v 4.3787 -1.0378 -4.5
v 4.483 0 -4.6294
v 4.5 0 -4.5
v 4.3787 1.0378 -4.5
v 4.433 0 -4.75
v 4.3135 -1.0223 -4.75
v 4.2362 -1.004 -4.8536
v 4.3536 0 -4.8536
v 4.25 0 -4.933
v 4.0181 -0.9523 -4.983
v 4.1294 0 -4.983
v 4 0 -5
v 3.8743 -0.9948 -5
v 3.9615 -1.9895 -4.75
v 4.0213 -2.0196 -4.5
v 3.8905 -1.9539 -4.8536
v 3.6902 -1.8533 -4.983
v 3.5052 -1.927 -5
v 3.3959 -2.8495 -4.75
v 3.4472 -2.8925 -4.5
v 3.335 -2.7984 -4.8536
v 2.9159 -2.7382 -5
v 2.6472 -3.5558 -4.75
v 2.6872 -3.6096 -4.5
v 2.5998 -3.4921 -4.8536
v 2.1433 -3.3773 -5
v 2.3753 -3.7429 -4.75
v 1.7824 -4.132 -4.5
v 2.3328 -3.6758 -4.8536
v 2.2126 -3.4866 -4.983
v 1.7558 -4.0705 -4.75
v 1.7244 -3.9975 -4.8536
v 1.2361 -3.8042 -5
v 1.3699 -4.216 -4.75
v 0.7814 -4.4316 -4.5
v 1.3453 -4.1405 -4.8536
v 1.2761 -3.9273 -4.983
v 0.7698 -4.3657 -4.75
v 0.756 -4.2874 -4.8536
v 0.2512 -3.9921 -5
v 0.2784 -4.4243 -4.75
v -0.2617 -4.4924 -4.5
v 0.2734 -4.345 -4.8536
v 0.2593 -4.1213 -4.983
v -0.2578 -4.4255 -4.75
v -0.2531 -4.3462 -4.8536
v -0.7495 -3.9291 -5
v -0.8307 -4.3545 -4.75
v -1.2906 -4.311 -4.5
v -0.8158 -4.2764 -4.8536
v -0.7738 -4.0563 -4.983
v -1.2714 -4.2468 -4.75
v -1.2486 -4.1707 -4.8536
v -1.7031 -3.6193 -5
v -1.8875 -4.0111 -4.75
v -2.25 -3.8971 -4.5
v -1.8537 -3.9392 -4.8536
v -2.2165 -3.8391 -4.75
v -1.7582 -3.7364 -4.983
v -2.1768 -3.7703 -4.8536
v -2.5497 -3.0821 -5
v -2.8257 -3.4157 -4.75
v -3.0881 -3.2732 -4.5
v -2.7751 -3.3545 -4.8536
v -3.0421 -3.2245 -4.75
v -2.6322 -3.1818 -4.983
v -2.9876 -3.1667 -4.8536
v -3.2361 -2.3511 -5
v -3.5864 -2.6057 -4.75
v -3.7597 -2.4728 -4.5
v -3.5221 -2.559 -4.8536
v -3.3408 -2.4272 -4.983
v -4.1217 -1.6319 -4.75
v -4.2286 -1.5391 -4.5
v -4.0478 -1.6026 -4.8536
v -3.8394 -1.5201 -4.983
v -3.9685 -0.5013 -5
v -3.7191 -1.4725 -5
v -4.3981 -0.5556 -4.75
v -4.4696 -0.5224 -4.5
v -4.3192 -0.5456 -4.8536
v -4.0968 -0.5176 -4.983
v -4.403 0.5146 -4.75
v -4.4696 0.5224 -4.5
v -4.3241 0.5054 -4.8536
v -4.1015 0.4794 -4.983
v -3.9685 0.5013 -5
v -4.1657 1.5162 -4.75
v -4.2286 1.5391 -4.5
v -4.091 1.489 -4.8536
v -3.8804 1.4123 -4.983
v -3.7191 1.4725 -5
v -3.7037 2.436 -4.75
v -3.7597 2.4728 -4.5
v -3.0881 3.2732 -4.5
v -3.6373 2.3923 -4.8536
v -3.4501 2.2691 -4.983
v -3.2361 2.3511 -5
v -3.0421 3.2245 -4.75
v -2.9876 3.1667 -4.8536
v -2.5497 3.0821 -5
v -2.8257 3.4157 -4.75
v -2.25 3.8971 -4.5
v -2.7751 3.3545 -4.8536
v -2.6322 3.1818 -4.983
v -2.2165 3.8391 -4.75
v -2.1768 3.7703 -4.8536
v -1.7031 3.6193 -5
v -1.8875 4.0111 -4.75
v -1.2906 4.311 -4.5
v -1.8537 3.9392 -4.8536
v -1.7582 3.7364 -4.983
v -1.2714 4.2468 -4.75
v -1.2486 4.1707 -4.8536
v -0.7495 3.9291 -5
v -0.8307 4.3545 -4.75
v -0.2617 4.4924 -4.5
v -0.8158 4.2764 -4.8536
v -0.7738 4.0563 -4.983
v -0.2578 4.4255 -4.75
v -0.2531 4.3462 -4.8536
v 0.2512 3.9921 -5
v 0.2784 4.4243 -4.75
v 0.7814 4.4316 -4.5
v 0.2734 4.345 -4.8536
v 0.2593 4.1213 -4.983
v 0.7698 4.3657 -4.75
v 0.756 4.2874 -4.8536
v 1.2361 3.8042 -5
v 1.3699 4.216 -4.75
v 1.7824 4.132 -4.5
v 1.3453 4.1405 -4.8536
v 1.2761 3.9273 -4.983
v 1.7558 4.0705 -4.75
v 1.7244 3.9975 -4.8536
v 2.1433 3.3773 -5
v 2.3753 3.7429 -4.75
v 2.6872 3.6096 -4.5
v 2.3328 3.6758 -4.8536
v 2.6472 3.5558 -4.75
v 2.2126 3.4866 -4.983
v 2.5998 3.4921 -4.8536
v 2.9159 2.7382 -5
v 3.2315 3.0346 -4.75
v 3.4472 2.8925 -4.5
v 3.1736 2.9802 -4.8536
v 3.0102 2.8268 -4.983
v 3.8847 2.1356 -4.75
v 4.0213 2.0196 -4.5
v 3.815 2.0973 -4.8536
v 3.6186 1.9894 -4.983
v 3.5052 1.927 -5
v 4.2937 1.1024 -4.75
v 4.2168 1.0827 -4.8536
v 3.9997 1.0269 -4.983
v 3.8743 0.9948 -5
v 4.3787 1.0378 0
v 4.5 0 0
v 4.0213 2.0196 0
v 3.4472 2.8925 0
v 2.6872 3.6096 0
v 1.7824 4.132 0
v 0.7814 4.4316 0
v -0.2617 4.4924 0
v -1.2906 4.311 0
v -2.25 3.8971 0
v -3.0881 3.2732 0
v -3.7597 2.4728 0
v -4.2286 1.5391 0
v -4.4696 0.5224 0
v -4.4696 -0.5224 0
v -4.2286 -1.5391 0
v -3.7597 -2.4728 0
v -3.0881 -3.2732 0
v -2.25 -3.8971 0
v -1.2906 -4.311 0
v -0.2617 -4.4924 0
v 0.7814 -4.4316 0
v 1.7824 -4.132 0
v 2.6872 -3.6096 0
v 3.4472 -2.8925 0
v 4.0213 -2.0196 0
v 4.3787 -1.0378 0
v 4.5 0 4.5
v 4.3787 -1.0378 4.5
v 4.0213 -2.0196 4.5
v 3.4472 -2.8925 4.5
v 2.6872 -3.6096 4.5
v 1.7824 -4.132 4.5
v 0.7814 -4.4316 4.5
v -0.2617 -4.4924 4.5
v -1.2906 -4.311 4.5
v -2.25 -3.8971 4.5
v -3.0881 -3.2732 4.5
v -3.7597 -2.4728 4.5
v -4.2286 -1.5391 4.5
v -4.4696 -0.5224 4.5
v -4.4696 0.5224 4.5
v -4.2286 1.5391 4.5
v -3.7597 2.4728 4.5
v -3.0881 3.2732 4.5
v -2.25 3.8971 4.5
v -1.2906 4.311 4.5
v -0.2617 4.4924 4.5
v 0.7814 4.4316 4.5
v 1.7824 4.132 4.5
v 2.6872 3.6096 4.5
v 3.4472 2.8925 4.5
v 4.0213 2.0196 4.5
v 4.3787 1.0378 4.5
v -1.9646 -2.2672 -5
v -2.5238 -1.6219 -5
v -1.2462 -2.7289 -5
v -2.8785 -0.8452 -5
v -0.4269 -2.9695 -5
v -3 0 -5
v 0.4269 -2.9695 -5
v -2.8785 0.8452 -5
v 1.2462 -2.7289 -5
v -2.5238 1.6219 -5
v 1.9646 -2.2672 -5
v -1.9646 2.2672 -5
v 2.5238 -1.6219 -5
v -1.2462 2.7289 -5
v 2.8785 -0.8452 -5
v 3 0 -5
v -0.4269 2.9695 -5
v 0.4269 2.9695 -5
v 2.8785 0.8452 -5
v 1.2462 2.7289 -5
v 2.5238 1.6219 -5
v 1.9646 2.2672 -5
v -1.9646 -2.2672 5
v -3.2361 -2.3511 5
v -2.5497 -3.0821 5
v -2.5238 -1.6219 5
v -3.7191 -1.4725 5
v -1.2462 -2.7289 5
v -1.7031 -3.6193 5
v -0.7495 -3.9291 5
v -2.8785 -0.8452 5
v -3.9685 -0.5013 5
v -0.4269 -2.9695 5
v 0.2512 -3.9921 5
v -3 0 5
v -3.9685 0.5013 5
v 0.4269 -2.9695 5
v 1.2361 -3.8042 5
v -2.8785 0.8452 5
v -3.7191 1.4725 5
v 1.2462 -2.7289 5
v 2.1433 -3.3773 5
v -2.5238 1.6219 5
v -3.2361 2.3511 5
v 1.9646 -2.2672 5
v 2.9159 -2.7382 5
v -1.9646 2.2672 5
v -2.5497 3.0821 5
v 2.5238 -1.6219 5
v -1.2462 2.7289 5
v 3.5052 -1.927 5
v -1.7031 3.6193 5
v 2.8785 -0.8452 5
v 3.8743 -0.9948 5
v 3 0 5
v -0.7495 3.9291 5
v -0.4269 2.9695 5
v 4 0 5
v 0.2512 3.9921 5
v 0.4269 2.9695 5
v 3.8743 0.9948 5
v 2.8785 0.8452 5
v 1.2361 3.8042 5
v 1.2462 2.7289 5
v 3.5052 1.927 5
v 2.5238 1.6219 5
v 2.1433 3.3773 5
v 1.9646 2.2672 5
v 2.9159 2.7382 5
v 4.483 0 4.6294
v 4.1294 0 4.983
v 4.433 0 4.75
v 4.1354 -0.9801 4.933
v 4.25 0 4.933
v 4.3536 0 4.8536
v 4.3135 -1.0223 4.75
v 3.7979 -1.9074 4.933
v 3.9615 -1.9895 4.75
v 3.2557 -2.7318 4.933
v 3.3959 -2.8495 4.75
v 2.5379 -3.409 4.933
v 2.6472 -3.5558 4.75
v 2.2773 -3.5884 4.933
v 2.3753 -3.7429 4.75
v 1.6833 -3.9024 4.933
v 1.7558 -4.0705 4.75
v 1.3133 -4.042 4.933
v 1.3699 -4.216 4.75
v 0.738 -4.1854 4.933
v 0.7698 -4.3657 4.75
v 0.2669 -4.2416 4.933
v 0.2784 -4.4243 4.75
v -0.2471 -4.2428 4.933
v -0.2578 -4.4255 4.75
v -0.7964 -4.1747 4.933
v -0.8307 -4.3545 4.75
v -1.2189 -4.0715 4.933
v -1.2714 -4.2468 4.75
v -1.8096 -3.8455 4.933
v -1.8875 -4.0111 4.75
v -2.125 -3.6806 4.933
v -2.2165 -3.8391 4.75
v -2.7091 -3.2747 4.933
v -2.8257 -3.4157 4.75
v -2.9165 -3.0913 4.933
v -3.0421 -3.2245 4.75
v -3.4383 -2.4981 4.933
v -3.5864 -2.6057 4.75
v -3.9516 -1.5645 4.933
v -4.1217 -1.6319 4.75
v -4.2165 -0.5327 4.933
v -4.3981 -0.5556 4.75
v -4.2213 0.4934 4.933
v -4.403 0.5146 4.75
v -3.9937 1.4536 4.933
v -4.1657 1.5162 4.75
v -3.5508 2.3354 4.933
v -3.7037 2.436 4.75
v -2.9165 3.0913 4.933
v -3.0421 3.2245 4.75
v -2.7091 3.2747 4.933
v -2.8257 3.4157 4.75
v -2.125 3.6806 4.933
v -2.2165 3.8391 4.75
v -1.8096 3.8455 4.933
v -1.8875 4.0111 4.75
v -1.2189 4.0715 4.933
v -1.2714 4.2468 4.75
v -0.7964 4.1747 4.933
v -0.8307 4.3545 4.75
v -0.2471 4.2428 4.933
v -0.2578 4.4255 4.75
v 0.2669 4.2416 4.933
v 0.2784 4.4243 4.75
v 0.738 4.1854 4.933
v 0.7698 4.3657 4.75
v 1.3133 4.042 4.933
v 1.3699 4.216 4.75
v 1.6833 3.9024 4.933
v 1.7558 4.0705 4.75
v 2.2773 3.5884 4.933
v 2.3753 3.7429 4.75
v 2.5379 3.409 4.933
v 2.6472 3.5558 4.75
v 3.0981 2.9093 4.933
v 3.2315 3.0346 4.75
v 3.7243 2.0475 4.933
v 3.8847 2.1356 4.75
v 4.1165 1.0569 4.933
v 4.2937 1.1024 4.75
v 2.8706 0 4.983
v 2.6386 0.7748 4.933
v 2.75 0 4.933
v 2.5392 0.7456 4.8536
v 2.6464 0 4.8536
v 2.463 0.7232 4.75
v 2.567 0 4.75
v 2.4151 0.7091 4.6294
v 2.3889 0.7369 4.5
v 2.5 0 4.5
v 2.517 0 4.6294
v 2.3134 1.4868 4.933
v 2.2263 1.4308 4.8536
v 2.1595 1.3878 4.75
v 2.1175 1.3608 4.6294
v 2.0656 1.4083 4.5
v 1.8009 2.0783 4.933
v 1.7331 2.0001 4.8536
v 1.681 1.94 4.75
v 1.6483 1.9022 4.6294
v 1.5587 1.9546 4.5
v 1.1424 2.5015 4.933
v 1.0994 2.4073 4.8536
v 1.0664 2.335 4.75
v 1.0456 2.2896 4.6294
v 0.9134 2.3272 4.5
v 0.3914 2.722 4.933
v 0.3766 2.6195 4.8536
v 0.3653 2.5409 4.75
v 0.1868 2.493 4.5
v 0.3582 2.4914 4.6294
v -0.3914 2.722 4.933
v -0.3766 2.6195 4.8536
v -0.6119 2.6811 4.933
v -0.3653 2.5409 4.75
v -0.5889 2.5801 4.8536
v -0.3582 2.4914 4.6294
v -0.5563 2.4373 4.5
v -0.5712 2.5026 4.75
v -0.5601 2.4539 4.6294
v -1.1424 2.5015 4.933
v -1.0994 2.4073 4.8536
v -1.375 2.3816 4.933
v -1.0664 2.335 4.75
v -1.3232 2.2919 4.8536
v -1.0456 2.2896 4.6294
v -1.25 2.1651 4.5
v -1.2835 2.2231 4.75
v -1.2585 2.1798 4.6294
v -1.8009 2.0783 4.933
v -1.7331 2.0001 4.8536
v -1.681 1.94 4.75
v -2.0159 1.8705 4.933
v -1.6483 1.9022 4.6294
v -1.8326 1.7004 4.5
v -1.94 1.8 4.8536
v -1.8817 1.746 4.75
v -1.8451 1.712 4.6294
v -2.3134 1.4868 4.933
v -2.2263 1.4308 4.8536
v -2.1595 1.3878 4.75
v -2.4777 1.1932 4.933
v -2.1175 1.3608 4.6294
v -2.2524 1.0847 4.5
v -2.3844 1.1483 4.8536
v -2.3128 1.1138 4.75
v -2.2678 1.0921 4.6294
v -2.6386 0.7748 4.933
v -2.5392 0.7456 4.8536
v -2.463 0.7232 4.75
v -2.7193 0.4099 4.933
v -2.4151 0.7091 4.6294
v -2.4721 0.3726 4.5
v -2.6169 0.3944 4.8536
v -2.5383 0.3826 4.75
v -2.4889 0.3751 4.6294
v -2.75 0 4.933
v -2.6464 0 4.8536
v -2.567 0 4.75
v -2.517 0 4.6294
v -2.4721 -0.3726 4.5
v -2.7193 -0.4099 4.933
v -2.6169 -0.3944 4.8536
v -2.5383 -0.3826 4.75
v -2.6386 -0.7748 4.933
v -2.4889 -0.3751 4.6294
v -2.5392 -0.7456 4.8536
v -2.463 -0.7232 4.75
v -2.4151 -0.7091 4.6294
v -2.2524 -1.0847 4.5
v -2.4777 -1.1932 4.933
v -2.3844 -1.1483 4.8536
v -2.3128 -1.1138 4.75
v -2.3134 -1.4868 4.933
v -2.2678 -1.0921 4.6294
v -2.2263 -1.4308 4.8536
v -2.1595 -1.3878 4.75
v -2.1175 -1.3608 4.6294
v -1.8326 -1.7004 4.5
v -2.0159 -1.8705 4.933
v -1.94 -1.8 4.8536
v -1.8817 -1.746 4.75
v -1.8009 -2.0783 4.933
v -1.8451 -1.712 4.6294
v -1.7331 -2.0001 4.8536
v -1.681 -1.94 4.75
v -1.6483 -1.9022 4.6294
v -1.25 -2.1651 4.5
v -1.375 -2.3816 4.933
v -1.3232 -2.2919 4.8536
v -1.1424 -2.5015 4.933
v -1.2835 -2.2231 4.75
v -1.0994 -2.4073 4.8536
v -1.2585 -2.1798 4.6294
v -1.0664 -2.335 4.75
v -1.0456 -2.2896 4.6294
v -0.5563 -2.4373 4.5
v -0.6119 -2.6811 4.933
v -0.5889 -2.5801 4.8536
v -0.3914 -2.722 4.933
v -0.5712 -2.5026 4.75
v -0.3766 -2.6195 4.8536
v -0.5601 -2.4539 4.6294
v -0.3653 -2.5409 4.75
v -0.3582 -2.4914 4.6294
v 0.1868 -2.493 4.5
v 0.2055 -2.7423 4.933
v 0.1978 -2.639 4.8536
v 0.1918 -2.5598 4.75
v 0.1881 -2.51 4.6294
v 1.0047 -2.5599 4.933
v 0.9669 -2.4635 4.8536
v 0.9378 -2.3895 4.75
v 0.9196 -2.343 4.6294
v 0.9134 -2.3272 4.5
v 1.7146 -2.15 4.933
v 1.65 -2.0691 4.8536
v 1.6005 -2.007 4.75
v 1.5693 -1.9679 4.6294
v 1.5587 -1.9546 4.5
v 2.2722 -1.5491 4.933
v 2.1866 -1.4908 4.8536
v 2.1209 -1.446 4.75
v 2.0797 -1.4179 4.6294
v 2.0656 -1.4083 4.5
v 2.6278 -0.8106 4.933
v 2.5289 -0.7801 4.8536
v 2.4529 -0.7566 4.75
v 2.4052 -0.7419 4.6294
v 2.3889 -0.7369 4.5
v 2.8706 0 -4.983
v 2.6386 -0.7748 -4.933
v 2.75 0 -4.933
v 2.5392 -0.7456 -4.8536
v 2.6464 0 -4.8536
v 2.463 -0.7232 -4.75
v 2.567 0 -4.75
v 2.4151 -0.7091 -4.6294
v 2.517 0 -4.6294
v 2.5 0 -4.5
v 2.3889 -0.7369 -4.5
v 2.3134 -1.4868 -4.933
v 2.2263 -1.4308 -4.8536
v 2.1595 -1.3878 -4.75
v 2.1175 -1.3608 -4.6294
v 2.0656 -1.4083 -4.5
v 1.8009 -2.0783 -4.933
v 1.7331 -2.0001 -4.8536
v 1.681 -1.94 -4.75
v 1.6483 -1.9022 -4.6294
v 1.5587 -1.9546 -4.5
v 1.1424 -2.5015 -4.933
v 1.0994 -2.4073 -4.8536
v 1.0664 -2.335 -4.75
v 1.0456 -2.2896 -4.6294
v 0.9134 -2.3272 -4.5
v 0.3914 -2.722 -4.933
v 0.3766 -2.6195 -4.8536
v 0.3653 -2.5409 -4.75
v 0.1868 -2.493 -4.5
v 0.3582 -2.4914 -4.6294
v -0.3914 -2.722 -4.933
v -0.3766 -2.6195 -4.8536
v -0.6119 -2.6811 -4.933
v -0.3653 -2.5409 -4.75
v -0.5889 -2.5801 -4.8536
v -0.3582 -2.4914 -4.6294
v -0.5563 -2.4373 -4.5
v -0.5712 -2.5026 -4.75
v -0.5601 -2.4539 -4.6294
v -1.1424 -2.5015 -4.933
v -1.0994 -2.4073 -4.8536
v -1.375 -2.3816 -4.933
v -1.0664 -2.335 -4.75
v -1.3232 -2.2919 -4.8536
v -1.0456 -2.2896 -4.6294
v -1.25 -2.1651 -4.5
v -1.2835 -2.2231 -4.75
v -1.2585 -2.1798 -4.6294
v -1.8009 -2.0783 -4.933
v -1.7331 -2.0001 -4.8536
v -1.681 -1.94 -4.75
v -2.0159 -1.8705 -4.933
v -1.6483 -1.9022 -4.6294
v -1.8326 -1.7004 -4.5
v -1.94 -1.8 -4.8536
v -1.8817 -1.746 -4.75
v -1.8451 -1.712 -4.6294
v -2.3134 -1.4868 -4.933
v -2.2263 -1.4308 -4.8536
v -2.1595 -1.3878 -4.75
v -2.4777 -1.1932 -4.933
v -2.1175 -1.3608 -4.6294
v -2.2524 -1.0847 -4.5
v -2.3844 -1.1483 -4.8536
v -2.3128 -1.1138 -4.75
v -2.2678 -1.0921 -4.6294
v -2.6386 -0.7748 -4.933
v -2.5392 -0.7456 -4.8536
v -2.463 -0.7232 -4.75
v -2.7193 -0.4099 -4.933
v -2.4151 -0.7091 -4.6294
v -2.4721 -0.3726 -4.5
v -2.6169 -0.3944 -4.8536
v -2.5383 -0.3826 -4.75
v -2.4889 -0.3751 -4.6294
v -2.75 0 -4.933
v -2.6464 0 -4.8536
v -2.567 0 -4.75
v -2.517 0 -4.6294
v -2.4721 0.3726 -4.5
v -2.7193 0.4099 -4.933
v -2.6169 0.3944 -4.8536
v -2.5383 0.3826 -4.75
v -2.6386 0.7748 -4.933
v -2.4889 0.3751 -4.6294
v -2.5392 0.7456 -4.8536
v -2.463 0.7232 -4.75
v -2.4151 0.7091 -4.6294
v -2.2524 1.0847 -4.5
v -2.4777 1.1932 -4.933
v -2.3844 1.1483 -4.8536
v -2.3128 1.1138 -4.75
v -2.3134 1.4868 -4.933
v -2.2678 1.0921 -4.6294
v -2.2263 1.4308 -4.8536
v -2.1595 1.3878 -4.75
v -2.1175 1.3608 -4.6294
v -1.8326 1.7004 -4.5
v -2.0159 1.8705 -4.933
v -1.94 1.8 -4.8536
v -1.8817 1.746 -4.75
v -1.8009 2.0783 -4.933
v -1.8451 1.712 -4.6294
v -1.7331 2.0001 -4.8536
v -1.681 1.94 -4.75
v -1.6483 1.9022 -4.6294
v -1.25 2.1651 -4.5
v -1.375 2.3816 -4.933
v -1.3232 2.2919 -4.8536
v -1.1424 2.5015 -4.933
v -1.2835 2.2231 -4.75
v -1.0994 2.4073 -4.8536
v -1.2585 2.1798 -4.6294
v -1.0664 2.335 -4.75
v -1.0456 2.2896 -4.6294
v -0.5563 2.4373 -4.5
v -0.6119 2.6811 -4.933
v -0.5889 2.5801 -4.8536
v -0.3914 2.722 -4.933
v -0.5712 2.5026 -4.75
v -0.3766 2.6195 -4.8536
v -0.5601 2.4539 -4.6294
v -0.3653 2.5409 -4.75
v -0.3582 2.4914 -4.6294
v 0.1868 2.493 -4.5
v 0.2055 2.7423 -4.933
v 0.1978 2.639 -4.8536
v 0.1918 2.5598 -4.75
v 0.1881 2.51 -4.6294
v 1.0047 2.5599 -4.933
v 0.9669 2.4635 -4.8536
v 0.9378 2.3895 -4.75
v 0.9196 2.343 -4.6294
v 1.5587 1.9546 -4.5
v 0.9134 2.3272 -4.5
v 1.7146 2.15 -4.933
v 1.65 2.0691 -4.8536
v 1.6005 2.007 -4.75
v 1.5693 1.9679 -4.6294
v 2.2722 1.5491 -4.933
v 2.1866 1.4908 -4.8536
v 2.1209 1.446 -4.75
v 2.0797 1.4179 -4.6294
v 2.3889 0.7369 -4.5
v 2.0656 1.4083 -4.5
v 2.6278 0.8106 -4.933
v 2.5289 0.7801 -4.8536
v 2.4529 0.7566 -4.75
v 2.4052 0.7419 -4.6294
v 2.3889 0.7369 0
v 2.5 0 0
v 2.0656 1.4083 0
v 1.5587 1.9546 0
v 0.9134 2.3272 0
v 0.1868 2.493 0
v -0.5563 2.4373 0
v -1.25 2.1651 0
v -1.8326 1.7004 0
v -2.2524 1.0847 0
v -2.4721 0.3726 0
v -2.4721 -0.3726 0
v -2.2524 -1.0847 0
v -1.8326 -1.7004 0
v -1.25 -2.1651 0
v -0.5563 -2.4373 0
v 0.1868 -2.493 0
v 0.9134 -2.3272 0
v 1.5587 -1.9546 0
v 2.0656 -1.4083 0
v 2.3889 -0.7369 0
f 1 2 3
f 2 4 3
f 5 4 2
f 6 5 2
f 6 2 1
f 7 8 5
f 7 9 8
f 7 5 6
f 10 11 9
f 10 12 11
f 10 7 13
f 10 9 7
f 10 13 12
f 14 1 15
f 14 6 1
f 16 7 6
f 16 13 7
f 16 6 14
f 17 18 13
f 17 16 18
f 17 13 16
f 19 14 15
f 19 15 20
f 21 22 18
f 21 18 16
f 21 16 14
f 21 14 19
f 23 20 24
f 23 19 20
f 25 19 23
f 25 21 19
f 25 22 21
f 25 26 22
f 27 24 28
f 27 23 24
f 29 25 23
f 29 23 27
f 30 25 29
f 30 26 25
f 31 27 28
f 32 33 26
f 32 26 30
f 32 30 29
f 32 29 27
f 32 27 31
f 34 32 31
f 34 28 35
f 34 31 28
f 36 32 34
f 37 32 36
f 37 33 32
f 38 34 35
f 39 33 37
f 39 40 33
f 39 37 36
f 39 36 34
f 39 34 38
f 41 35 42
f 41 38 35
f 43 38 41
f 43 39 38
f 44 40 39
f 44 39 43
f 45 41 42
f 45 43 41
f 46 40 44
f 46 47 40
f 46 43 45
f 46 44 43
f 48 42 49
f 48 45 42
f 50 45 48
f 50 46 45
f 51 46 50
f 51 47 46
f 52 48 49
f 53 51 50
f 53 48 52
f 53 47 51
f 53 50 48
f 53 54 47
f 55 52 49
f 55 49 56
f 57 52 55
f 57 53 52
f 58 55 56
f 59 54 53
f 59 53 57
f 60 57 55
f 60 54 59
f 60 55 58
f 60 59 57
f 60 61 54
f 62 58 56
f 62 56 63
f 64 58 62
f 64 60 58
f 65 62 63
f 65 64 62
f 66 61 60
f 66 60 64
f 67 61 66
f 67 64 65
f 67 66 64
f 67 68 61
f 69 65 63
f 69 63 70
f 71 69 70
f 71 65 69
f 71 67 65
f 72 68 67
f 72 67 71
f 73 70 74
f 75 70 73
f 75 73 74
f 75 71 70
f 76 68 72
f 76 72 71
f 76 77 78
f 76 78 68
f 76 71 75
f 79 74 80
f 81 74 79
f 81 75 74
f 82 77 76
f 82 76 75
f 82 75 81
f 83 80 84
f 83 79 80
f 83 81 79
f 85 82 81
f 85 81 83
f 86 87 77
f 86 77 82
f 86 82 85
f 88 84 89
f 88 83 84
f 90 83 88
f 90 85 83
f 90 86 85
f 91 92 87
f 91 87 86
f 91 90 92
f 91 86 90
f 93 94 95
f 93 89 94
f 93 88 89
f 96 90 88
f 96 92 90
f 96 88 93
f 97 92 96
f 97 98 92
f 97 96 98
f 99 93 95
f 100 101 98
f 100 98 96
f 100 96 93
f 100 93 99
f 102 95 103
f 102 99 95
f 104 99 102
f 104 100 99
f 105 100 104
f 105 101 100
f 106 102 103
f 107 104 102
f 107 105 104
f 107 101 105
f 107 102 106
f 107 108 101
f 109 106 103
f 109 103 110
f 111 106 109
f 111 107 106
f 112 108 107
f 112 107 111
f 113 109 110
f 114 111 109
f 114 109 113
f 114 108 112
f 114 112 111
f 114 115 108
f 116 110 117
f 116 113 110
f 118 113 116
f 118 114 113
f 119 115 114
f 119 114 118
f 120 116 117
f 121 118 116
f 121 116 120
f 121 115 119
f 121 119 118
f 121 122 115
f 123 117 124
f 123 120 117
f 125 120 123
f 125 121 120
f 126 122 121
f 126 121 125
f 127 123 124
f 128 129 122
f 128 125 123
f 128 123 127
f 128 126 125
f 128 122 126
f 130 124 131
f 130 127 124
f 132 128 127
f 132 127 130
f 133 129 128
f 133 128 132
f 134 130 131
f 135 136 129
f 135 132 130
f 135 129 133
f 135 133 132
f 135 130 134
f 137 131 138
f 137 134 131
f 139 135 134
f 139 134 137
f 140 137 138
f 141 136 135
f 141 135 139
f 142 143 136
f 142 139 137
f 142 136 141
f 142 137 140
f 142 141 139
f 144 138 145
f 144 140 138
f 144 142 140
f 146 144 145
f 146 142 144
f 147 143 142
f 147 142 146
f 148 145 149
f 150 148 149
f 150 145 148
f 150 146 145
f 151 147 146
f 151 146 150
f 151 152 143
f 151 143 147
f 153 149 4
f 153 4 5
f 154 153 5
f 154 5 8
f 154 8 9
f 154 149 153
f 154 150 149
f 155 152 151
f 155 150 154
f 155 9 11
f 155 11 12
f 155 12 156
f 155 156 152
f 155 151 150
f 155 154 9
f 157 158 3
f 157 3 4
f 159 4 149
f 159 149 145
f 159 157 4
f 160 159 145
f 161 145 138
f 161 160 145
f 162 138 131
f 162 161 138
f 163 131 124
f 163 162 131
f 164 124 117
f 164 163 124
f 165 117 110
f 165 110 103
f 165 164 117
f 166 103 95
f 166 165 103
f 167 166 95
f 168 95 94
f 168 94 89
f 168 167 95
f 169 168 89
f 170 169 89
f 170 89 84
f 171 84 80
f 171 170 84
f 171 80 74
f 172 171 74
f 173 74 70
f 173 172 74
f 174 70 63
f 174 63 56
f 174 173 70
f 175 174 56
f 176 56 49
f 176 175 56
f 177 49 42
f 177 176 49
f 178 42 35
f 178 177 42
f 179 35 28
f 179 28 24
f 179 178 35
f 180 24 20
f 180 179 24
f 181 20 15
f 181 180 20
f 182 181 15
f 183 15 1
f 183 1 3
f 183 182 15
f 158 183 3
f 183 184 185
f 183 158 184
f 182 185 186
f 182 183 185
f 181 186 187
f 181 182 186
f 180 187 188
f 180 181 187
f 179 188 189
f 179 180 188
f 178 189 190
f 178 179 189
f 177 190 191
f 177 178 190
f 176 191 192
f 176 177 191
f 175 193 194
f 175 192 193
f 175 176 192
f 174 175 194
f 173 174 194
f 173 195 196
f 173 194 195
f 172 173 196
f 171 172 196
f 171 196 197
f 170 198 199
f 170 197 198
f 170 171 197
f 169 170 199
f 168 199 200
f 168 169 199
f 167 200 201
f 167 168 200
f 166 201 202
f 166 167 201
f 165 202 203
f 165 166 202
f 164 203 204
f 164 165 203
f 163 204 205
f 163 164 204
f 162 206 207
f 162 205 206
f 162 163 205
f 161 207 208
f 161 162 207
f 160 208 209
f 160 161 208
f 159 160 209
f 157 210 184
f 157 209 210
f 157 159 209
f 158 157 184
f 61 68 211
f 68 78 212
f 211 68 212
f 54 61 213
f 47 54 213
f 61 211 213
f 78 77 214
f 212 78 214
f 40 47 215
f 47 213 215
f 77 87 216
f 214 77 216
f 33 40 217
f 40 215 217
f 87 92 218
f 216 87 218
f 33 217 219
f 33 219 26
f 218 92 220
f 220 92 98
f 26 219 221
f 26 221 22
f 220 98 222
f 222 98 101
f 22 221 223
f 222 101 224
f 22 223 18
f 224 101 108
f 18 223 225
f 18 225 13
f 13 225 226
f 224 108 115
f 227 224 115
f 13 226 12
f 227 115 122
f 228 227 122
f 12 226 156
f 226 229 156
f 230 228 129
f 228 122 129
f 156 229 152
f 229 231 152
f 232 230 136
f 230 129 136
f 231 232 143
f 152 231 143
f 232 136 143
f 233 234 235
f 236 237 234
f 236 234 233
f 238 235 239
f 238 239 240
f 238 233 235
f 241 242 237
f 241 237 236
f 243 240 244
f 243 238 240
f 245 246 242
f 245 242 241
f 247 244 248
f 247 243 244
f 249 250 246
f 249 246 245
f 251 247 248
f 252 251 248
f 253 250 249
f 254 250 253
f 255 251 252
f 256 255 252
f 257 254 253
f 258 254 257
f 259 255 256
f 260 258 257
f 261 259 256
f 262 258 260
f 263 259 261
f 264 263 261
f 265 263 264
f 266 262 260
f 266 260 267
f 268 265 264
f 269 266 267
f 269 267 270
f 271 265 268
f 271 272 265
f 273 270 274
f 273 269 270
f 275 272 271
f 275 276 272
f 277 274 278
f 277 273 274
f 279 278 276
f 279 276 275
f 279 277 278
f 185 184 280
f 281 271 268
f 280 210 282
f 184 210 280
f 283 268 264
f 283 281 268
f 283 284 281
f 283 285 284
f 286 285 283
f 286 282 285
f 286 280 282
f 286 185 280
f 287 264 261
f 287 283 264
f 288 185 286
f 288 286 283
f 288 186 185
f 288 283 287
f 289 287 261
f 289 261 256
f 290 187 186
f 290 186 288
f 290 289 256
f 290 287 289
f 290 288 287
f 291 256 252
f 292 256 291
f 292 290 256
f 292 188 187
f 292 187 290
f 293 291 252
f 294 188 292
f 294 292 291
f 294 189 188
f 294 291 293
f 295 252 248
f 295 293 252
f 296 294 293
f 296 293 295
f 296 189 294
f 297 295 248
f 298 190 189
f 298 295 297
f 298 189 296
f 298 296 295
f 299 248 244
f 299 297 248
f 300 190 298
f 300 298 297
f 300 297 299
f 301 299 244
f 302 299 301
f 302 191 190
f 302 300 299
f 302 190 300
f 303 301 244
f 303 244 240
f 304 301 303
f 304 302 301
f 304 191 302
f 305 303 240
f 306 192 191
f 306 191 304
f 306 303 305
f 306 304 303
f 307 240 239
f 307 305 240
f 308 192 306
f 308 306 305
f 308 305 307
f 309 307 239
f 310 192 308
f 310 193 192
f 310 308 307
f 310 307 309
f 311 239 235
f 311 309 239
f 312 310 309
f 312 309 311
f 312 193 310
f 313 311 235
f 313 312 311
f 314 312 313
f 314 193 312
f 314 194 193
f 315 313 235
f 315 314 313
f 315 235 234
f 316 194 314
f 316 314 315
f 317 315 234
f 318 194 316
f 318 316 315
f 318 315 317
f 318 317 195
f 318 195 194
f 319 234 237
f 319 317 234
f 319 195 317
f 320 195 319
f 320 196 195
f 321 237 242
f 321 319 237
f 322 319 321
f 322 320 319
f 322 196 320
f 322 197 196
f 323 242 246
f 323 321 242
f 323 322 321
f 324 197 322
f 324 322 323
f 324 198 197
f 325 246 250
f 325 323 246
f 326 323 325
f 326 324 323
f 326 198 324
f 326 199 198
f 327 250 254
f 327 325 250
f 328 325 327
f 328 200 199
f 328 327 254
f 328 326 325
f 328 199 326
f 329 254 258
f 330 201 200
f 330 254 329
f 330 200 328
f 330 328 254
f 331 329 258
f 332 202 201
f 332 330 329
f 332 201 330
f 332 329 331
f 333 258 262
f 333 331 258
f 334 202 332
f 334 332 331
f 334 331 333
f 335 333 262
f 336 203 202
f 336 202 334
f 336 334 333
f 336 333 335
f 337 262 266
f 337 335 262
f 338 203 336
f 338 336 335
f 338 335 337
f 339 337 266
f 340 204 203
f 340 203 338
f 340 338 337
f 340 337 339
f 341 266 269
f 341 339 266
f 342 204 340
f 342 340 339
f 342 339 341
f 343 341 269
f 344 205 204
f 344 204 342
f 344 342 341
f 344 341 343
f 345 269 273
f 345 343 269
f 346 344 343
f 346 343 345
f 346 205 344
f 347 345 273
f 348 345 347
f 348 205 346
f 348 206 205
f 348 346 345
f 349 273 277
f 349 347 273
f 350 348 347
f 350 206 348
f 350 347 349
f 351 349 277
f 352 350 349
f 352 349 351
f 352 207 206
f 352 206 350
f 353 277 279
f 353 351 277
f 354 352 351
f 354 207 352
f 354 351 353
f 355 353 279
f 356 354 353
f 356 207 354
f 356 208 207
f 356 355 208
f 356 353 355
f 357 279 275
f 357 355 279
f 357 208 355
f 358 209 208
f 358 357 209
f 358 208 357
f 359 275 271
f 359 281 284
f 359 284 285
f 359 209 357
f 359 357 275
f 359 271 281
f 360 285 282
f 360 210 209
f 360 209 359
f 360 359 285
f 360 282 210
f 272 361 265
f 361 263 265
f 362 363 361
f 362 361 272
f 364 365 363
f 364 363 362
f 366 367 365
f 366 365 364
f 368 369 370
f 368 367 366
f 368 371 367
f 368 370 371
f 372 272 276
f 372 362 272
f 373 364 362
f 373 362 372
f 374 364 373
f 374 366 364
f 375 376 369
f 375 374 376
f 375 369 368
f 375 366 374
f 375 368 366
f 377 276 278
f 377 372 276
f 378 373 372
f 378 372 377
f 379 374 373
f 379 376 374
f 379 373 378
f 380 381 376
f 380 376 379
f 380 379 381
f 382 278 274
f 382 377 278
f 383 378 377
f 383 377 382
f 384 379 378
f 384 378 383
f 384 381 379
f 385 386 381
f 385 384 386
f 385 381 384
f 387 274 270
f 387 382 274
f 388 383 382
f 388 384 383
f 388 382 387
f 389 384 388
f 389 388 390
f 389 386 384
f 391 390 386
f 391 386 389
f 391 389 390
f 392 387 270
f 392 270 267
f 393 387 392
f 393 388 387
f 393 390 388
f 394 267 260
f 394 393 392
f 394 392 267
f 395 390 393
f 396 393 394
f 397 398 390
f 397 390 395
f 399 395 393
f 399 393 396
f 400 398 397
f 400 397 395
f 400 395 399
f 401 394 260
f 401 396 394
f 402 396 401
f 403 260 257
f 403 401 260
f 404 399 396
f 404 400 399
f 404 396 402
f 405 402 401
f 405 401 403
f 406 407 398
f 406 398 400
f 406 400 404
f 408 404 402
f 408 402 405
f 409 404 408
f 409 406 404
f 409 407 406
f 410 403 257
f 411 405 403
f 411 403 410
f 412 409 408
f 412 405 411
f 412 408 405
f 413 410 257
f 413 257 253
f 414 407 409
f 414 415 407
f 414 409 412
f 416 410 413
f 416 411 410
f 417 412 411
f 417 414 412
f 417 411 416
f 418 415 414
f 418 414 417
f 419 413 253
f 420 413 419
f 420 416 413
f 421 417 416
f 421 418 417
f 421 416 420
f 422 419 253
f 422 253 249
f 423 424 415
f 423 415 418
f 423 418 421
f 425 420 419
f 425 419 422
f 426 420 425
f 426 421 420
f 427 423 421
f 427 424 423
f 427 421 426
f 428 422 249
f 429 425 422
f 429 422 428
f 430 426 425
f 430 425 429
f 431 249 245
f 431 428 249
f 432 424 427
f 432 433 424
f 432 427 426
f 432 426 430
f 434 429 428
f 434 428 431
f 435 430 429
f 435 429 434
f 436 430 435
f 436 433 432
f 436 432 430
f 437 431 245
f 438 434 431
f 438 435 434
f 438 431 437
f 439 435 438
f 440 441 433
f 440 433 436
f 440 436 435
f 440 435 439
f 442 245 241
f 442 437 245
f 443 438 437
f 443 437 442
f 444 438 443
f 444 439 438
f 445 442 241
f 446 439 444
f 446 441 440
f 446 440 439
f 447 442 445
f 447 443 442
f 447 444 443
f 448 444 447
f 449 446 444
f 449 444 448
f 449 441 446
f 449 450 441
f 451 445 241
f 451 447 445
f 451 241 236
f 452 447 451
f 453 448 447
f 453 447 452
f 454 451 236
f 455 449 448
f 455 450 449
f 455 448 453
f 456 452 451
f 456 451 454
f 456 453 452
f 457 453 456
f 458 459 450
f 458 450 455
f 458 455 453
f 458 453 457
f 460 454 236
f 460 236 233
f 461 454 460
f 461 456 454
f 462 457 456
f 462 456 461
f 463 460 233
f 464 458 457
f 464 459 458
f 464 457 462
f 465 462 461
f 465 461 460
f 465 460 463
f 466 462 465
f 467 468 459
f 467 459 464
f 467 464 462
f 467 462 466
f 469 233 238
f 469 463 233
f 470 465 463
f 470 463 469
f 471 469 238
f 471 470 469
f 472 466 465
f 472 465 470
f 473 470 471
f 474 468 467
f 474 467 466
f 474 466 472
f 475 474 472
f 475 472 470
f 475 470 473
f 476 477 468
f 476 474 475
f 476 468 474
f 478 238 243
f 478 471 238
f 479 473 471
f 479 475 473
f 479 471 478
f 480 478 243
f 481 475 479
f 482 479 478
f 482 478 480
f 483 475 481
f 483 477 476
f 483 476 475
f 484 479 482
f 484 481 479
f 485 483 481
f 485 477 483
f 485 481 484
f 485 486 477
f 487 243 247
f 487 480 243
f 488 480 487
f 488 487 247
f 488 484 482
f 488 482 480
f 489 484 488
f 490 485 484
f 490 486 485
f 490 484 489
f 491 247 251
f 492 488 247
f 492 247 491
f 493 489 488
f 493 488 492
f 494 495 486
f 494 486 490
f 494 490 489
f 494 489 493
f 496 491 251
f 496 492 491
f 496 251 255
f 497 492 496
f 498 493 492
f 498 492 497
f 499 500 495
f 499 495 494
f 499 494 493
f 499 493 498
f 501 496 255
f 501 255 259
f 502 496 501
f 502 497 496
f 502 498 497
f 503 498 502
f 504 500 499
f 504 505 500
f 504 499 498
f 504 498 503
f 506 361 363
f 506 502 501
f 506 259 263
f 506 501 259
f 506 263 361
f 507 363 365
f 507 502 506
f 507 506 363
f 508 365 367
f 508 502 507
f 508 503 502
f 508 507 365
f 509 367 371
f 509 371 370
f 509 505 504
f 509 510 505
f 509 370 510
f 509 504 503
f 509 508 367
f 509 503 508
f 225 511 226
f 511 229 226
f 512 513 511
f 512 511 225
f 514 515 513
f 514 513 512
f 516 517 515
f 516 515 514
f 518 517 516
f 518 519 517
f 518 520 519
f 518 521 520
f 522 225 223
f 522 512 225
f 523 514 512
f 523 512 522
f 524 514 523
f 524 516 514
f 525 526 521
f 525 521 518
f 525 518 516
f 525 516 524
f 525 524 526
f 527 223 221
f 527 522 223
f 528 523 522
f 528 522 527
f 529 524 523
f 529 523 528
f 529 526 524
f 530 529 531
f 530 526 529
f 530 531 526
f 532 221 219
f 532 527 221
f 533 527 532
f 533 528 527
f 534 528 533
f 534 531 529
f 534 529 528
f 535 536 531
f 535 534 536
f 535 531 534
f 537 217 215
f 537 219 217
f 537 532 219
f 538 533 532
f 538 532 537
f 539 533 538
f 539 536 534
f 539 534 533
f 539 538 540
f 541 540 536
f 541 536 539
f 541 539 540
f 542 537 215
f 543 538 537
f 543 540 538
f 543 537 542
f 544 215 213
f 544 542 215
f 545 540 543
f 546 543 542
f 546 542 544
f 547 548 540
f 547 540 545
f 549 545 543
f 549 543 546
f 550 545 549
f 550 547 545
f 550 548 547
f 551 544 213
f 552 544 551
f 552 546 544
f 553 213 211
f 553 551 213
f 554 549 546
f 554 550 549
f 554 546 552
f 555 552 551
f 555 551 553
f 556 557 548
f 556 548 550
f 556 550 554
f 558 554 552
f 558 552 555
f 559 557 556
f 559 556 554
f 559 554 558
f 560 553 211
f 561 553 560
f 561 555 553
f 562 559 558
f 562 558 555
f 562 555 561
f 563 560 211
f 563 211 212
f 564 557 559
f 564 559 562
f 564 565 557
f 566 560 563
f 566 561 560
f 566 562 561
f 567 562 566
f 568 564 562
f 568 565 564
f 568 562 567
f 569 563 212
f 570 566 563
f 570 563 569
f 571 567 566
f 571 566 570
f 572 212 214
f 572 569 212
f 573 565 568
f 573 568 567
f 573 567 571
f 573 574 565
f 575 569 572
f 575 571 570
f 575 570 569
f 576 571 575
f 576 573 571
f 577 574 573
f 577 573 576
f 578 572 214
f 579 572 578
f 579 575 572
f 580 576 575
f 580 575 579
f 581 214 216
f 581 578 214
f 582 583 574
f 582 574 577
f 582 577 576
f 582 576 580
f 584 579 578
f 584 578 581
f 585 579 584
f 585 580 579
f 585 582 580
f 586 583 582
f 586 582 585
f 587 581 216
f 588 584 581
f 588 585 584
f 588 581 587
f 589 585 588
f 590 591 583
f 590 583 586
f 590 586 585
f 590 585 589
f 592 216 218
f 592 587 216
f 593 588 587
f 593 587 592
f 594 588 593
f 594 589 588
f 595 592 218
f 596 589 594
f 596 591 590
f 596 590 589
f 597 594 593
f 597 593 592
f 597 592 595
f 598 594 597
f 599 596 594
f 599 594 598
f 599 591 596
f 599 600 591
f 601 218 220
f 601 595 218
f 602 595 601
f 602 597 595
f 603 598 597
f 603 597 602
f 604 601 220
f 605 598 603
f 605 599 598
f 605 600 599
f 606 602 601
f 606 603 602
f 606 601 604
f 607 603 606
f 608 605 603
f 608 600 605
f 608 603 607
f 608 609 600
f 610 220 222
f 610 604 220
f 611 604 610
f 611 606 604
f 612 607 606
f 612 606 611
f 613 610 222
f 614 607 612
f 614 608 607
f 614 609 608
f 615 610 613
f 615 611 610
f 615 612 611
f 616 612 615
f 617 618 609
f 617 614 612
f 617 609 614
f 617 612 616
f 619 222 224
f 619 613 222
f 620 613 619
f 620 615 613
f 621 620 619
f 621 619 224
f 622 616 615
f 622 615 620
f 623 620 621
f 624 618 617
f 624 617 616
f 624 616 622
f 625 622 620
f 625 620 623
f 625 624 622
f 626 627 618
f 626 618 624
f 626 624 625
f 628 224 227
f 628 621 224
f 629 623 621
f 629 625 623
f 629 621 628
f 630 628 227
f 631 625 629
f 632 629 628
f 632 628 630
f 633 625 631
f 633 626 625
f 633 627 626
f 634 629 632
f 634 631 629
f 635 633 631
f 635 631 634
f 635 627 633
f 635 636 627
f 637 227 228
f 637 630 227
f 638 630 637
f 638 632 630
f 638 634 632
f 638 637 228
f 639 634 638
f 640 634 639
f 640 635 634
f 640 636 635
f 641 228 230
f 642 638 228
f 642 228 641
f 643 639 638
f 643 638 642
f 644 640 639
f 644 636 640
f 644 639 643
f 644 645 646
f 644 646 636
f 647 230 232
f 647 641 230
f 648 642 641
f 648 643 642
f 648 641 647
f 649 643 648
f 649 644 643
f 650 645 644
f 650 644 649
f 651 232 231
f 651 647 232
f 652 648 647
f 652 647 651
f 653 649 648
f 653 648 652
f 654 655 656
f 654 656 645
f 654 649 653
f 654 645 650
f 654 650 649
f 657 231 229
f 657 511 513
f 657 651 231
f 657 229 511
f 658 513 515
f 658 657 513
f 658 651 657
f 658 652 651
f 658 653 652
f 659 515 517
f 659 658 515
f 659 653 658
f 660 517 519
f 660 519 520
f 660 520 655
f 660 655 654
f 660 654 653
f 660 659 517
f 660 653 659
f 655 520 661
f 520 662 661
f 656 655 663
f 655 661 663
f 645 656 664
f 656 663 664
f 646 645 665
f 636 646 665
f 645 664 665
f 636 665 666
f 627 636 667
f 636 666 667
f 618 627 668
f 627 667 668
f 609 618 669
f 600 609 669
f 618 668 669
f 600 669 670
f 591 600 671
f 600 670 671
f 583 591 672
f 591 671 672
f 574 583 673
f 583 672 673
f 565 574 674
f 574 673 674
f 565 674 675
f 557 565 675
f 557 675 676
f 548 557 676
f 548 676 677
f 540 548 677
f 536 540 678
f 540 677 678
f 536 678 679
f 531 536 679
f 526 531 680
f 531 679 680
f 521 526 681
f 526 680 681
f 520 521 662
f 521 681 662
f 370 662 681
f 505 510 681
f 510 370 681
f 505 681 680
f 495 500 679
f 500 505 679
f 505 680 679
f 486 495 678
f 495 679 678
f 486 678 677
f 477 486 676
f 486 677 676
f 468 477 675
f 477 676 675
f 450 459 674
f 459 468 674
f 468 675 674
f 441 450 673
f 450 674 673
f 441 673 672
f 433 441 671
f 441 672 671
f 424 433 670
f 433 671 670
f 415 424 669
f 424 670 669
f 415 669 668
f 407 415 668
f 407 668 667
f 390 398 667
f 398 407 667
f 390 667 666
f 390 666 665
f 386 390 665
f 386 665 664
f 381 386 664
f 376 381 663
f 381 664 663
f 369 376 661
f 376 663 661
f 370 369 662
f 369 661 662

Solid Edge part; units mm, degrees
sketch "Sketch1" plane through (0, 0, 0) normal (0, 0, 1) x (1, 0, 0)
  circle A0 centre (0, 0) radius 4.5
  circle A1 centre (0, 0) radius 2.5
  dimension "D1" = 9
  dimension "D2" = 5
extrude "Protrusion1" add sketch "Sketch1" along normal mid plane 10
fillet "Round_1" radius 0.5 2 edges at (-2.5, 0, -5) (-2.5, 0, 5)
fillet "Round_2" radius 0.5 2 edges at (-4.5, 0, -5) (-4.5, 0, 5)
properties material "Acrylic, high impact grade"
